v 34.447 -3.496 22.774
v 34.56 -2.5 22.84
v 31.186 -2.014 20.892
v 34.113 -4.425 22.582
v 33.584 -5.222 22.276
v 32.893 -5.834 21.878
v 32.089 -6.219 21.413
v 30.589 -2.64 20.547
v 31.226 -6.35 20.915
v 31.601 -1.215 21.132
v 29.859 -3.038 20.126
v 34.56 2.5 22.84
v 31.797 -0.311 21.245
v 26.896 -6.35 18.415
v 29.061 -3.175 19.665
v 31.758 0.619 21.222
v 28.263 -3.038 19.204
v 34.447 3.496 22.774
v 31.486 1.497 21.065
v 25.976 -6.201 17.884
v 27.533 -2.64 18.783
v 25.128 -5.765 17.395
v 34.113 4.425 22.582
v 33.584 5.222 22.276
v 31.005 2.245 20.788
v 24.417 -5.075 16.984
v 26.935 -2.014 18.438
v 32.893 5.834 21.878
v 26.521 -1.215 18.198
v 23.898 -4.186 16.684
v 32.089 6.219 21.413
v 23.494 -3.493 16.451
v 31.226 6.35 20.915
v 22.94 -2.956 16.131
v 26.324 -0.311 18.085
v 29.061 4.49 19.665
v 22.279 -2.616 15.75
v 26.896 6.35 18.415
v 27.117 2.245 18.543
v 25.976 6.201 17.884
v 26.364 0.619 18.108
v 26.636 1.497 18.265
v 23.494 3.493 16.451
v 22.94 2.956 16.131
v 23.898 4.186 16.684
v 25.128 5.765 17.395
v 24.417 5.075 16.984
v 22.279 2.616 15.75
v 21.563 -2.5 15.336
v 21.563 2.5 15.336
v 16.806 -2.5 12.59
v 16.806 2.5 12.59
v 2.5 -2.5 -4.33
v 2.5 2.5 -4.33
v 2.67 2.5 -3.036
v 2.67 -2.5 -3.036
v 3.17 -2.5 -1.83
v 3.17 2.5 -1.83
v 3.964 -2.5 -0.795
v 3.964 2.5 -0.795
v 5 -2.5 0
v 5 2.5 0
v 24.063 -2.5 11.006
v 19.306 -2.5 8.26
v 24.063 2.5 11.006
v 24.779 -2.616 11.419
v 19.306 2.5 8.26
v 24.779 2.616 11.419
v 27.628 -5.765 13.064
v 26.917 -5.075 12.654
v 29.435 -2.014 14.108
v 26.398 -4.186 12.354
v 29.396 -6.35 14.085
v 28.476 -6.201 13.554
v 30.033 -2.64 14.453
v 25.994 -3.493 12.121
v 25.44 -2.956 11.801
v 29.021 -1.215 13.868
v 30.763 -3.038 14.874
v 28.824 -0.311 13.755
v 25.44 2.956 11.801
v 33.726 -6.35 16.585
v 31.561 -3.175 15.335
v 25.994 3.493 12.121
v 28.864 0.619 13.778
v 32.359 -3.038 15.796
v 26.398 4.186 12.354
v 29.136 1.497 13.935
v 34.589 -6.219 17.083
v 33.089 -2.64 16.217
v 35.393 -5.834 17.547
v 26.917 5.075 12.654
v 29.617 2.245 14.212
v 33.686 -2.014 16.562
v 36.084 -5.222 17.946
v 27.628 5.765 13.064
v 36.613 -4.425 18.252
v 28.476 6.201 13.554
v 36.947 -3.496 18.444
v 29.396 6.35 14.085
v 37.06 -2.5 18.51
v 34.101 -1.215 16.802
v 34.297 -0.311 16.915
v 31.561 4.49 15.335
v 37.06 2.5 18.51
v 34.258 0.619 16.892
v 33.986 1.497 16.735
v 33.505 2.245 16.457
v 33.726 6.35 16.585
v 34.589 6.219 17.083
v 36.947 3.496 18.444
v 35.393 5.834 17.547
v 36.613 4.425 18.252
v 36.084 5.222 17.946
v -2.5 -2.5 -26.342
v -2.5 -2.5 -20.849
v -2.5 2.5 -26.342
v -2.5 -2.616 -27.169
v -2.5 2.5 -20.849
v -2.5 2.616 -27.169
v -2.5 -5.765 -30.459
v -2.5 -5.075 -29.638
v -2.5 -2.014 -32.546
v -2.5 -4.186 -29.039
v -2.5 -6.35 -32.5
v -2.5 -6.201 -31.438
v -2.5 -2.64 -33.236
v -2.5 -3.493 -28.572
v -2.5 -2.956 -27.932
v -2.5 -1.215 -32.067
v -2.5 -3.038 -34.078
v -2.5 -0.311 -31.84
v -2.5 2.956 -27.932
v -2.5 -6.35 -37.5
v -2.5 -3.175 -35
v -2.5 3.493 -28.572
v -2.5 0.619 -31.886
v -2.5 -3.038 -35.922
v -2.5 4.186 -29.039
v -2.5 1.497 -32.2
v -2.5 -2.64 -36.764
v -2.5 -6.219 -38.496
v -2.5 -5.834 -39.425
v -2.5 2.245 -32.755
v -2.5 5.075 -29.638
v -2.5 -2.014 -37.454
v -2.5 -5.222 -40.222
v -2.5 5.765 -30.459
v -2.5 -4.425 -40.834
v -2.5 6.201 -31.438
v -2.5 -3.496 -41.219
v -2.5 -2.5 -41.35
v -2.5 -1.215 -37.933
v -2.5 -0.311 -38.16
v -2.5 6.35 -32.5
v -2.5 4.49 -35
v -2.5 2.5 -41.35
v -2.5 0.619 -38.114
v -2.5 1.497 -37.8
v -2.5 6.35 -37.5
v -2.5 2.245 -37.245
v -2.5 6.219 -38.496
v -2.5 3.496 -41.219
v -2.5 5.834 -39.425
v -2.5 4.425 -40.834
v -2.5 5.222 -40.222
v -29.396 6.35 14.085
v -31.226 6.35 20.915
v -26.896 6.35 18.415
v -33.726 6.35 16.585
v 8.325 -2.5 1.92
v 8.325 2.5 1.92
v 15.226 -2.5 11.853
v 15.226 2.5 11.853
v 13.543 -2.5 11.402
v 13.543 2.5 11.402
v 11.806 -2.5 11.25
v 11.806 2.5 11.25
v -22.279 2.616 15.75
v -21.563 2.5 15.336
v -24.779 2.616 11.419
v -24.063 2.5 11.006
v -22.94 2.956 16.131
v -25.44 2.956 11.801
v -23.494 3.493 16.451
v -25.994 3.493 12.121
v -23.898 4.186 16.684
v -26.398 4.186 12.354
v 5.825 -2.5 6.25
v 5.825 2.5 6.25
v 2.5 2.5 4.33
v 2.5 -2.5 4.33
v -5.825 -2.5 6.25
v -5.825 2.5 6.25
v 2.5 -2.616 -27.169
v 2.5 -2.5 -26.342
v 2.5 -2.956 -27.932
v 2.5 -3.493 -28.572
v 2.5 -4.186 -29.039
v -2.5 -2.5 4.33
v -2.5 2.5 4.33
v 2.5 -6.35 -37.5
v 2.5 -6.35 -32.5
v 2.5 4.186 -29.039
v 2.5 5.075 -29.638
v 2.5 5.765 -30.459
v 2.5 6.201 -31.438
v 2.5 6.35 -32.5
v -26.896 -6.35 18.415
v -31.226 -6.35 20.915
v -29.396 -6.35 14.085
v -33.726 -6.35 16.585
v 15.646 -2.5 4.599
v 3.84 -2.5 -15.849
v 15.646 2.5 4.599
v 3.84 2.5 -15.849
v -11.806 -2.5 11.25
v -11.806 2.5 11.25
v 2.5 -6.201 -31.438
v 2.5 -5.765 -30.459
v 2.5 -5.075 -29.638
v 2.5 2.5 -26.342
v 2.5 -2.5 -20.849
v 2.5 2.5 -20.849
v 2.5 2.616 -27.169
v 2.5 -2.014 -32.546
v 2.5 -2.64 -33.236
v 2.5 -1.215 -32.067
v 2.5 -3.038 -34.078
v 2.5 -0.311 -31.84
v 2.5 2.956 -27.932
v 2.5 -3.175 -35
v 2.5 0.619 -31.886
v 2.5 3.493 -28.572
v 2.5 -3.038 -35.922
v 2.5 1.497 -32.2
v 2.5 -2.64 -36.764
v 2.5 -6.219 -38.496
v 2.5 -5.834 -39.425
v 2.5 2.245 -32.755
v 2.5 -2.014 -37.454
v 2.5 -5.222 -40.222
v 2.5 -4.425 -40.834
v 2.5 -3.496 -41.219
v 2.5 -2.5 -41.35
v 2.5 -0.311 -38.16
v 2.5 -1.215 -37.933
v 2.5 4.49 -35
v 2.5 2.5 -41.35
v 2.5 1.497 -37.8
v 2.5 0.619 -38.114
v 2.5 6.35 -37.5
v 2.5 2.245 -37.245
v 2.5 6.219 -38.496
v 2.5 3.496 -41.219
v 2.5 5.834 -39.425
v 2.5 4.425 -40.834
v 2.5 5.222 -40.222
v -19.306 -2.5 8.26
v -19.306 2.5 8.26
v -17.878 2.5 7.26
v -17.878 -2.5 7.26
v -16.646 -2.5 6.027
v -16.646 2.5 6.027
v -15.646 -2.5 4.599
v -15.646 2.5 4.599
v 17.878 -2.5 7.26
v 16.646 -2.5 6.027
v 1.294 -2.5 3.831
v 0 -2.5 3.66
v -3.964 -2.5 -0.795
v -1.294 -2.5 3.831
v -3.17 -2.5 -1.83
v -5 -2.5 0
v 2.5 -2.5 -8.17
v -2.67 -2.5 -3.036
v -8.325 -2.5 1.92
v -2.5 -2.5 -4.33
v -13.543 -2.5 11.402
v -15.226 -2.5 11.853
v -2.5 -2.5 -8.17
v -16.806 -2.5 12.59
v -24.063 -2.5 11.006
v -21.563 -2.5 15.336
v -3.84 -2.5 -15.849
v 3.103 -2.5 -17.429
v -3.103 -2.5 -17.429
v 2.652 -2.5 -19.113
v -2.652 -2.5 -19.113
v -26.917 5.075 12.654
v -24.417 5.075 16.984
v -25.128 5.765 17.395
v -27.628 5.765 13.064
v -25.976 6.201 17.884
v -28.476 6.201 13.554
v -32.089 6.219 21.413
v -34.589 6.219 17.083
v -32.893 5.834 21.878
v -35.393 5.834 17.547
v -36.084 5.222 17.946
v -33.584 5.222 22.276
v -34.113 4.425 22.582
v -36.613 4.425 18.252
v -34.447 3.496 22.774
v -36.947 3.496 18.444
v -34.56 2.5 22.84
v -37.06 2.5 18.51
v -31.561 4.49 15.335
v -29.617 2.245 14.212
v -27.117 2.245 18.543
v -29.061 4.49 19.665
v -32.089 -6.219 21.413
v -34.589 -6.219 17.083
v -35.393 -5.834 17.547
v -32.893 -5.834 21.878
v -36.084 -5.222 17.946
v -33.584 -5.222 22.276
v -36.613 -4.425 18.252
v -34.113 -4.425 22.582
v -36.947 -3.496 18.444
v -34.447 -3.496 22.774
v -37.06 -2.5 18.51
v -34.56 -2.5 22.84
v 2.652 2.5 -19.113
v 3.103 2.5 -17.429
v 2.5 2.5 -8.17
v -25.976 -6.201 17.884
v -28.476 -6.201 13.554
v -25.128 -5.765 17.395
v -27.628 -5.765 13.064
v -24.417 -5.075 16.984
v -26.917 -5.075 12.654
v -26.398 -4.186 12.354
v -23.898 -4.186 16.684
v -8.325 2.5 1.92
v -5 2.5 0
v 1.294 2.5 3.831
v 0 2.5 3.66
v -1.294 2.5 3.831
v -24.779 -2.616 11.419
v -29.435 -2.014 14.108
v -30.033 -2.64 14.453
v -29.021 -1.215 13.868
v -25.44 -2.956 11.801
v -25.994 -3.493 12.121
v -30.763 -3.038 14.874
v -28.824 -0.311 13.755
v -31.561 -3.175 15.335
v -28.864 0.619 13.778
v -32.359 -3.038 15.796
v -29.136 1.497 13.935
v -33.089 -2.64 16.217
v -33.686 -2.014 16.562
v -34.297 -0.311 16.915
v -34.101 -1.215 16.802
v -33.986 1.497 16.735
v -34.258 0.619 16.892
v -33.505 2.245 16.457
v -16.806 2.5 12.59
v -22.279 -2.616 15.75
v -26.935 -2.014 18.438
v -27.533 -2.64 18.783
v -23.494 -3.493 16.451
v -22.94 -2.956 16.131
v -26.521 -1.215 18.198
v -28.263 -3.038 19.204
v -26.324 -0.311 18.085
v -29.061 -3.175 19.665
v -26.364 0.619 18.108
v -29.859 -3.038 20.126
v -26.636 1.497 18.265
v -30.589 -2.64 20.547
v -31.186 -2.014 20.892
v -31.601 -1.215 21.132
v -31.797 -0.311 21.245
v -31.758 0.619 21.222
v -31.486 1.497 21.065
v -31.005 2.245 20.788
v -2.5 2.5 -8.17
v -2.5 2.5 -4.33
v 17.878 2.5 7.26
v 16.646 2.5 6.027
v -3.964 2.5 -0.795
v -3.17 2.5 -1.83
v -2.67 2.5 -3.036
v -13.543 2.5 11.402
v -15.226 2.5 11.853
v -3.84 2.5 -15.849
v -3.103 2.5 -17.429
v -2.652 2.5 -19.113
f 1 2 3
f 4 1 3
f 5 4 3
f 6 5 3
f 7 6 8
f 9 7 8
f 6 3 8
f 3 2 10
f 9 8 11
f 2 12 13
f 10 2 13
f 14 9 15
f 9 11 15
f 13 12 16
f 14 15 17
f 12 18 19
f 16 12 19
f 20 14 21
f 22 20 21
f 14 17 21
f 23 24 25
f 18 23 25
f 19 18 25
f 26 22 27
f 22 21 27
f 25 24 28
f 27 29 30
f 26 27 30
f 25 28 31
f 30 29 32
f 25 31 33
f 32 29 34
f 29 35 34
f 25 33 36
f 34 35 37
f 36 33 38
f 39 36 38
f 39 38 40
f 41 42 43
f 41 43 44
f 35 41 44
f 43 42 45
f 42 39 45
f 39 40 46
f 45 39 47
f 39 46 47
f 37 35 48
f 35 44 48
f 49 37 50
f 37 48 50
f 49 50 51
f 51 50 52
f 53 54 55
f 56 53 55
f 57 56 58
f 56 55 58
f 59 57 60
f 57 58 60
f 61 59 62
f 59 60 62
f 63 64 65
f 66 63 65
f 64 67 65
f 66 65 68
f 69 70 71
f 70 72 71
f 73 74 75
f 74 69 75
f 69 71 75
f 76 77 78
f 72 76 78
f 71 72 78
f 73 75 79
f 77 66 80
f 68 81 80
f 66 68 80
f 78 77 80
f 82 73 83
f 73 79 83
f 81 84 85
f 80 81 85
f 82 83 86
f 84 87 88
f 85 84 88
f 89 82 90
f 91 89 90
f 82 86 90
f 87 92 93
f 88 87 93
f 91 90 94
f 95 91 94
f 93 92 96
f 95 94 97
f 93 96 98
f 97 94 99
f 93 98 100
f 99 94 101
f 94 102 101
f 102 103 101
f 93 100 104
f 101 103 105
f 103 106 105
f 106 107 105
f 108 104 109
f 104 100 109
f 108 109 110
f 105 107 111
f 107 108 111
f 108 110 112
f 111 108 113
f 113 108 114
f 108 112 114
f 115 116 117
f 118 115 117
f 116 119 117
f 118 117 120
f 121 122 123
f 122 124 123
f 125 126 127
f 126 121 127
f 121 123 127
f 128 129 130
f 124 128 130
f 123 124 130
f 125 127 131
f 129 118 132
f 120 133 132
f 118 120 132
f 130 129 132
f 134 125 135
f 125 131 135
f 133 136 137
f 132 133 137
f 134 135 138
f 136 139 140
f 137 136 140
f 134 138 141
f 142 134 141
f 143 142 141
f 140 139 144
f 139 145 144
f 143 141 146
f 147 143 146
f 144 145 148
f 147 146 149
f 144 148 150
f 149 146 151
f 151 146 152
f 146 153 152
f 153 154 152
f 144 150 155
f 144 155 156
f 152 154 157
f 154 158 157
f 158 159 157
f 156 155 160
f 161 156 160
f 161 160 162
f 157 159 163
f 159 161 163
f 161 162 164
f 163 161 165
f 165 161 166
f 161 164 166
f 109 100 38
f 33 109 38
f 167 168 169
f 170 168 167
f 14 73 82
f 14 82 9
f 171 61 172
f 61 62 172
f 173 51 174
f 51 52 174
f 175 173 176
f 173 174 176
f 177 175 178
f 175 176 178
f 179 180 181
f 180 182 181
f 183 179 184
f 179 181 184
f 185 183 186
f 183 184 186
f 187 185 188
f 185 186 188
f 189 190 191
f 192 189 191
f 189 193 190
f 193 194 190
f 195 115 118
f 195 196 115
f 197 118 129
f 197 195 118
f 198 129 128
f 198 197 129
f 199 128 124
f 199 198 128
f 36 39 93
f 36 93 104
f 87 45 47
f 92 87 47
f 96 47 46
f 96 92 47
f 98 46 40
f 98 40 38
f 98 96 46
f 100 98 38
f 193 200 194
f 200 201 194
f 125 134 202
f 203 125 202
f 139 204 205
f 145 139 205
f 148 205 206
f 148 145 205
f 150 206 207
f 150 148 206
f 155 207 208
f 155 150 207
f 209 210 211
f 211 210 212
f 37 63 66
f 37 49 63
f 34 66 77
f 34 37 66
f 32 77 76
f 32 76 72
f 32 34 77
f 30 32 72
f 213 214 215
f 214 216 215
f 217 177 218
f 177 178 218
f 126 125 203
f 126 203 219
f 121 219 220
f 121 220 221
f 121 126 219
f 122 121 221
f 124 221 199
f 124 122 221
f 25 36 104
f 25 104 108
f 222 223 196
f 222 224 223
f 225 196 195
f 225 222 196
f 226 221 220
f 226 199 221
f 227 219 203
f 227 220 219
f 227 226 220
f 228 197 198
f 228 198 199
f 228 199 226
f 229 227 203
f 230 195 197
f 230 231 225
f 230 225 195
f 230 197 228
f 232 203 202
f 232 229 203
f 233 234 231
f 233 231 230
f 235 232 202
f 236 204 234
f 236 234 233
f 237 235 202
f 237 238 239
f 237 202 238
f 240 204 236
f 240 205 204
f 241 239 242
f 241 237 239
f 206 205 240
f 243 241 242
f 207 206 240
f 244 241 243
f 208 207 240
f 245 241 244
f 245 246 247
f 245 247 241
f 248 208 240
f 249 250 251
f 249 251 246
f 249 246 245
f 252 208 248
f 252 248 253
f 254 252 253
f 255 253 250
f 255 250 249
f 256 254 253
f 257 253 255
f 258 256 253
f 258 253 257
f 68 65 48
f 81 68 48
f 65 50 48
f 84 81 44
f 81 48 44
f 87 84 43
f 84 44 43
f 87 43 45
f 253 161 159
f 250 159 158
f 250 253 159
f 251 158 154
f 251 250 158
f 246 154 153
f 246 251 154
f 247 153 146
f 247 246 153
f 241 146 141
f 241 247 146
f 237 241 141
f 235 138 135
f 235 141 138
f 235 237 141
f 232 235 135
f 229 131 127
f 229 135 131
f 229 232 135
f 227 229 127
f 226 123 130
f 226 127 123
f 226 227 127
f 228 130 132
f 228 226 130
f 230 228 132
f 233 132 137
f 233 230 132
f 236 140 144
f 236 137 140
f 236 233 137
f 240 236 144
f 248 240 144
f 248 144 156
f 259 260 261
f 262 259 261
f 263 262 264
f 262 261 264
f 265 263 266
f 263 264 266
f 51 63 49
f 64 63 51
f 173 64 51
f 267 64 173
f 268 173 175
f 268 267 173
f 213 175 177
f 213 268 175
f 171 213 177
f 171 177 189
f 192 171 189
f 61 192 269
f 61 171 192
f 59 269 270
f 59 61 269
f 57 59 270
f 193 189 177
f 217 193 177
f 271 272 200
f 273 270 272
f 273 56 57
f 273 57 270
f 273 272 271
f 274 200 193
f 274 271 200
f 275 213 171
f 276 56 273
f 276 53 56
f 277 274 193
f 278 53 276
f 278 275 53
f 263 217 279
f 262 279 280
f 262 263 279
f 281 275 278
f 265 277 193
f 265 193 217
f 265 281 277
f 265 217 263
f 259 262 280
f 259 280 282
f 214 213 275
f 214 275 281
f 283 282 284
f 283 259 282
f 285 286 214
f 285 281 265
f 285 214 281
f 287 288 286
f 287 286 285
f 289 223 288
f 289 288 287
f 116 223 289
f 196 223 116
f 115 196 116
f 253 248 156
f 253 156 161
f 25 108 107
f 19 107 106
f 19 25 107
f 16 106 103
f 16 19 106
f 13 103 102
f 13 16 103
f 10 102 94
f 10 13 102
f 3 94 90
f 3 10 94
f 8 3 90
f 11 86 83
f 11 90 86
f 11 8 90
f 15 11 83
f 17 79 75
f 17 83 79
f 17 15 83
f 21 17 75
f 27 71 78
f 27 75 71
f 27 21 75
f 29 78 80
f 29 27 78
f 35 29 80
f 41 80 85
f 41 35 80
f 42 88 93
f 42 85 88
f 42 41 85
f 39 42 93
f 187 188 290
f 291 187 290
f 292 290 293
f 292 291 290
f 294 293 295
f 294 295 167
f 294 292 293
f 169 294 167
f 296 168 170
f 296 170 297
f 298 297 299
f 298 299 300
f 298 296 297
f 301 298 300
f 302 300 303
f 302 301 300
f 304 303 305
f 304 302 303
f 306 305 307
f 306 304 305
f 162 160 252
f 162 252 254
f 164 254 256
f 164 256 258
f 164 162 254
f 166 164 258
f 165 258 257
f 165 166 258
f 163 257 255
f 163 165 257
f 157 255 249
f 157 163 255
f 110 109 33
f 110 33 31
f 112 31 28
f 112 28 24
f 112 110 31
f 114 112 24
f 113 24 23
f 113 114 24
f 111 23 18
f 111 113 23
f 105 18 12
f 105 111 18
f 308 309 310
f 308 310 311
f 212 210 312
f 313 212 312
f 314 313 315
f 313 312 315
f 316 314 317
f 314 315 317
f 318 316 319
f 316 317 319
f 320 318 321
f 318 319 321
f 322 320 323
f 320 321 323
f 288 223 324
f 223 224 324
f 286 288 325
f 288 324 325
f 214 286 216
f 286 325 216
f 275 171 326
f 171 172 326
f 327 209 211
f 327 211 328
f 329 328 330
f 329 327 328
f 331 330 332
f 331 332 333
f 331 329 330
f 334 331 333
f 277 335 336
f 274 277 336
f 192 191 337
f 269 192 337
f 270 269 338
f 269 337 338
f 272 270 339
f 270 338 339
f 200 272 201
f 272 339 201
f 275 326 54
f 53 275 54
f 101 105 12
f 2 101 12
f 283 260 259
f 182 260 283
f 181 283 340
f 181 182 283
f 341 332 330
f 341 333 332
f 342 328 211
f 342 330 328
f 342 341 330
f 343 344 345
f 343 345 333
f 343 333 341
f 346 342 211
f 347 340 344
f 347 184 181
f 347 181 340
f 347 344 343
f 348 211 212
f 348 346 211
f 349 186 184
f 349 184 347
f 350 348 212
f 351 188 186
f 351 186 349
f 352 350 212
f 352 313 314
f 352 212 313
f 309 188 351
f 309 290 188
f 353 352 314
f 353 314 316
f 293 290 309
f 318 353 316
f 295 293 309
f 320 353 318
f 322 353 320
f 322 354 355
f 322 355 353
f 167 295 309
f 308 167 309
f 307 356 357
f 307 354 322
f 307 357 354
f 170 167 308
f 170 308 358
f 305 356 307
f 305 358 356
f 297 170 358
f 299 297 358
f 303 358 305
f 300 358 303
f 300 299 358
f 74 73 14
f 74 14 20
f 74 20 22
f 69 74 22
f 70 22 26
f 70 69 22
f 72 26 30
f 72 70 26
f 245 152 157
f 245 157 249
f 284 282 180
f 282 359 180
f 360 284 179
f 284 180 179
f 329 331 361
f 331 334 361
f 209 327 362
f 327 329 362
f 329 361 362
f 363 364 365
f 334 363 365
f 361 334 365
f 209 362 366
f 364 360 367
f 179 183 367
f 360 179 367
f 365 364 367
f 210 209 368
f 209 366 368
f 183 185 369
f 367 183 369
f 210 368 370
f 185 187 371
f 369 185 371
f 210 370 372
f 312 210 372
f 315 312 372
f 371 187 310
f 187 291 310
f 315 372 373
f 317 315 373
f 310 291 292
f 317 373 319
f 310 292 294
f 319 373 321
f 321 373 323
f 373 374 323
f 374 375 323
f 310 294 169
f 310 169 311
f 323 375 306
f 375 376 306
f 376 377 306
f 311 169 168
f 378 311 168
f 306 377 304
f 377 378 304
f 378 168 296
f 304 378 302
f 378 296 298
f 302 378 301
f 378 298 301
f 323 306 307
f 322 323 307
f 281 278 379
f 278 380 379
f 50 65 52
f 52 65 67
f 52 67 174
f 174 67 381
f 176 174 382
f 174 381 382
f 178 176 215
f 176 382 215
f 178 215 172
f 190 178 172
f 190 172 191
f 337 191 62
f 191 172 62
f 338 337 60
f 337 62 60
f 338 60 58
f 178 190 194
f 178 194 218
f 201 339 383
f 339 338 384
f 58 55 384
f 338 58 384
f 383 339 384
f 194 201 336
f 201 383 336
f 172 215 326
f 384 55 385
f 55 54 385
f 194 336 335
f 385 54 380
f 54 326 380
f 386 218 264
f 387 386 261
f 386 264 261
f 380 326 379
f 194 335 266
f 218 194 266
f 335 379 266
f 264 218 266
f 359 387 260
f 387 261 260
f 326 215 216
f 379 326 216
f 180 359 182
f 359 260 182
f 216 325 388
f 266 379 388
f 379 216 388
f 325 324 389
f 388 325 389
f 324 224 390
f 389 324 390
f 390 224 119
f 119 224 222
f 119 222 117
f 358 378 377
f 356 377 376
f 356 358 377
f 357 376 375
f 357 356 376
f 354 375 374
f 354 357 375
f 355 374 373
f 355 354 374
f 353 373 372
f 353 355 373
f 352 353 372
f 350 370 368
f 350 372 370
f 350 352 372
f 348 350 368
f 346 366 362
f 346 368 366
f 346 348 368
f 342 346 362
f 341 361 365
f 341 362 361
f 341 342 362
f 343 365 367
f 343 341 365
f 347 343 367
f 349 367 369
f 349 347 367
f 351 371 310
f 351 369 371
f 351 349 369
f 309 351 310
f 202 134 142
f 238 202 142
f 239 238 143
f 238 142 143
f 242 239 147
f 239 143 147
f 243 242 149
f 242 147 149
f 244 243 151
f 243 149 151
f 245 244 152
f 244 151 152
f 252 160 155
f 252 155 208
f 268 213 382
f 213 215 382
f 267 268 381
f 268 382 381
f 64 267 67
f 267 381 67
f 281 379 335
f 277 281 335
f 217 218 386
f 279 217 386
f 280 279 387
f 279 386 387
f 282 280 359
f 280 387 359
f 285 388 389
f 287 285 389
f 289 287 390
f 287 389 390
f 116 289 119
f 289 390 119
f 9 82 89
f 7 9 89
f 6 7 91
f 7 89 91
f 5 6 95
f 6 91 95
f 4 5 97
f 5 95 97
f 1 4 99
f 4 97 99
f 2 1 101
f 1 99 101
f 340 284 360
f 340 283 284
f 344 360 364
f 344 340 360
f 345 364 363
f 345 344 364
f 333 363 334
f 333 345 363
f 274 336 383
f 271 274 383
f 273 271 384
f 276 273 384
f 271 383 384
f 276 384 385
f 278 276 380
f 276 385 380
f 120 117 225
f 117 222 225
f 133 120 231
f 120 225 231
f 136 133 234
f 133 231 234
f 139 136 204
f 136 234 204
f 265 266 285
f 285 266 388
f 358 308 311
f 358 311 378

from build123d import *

# Parameters (mm, degrees)
SALIENTE_EXTRUIR1_DEPTH = 2.5
CROQUIS2_W              = 5
CROQUIS2_H              = 12.7
SALIENTE_EXTRUIR2_DEPTH = 6.350000000000001
CORTAR_EXTRUIR1_REACH   = 52.655
CORTAR_EXTRUIR2_REACH   = 52.655
MATRIZC7_COUNT          = 3
REDONDEO3_R             = 3
REDONDEO4_R             = 3
REDONDEO5_R             = 3
REDONDEO6_R             = 3
REDONDEO7_R             = 3
REDONDEO8_R             = 3


with BuildPart() as part:
    # Croquis1 → Saliente-Extruir1 (new, symmetric)
    with BuildSketch(Plane(origin=(0, 0, 0), x_dir=(1, 0, 0), z_dir=(0, 1, 0))):
        with BuildLine():
            Line((-2.5, 28.650000000000002), (2.5, 28.650000000000002))
            Line((2.5, 28.650000000000002), (2.5, 20.849364905389077))
            ThreePointArc((2.5, 20.849364905389077), (2.8407417371092976, 18.26117445436386), (3.8397459621556003, 15.84936490538906))
            Line((3.8397459621556003, 15.84936490538906), (15.64582562299427, -4.599364905389191))
            ThreePointArc((15.64582562299427, -4.599364905389191), (17.235011848973173, -6.670432717254639), (19.306079660838602, -8.259618943233573))
            Line((19.306079660838602, -8.259618943233573), (26.061627818424082, -12.159936490539094))
            Line((26.061627818424082, -12.159936490539094), (23.561627818424125, -16.490063509461137))
            Line((23.561627818424125, -16.490063509461137), (16.806079660838638, -12.589745962155668))
            ThreePointArc((16.806079660838638, -12.589745962155668), (14.394270111863824, -11.590741737109344), (11.80607966083859, -11.25000000000002))
            Line((11.80607966083859, -11.25000000000002), (-11.806079660838877, -11.250000000000021))
            ThreePointArc((-11.806079660838877, -11.250000000000021), (-14.394270111864046, -11.590741737109328), (-16.806079660838808, -12.589745962155595))
            Line((-16.806079660838808, -12.589745962155595), (-23.561627818424295, -16.490063509460935))
            Line((-23.561627818424295, -16.490063509460935), (-26.061627818424316, -12.15993649053858))
            Line((-26.061627818424316, -12.15993649053858), (-19.30607966083857, -8.259618943233107))
            ThreePointArc((-19.30607966083857, -8.259618943233107), (-17.235011848973045, -6.670432717254254), (-15.645825622994131, -4.5993649053887635))
            Line((-15.645825622994131, -4.5993649053887635), (-3.8397459621555967, 15.849364905389269))
            ThreePointArc((-3.8397459621555967, 15.849364905389269), (-2.8407417371093064, 18.26117445436405), (-2.5000000000000004, 20.84936490538924))
            Line((-2.5000000000000004, 20.84936490538924), (-2.5, 28.650000000000002))
        make_face()
        with BuildLine():
            Line((4.999999999999967, -1.648e-14), (8.325317547305488, -1.919872981077918))
            Line((8.325317547305488, -1.919872981077918), (2.5, 8.169872981077836))
            Line((2.5, 8.169872981077836), (2.5000000000000004, 4.330127018922162))
            ThreePointArc((2.5000000000000004, 4.330127018922162), (3.16987298107781, 1.8301270189221883), (4.999999999999967, -1.648e-14))
        make_face(mode=Mode.SUBTRACT)
        with BuildLine():
            Line((-2.499999999999762, -4.330127018922147), (-5.825317547305628, -6.250000000000082))
            Line((-5.825317547305628, -6.250000000000082), (5.825317547305489, -6.249999999999961))
            Line((5.825317547305489, -6.249999999999961), (2.5000000000002185, -4.3301270189221945))
            ThreePointArc((2.5000000000002185, -4.3301270189221945), (1.9836e-13, -3.660254037844239), (-2.499999999999762, -4.330127018922147))
        make_face(mode=Mode.SUBTRACT)
        with BuildLine():
            Line((-2.5000000000000004, 4.330127018922227), (-2.5, 8.169872981077782))
            Line((-2.5, 8.169872981077782), (-8.325317547305644, -1.9198729810777775))
            Line((-8.325317547305644, -1.9198729810777775), (-5.000000000000053, 0))
            ThreePointArc((-5.000000000000053, 0), (-3.1698729810778152, 1.8301270189221972), (-2.5000000000000004, 4.330127018922227))
        make_face(mode=Mode.SUBTRACT)
    extrude(amount=SALIENTE_EXTRUIR1_DEPTH, both=True)

    # Croquis2 → Saliente-Extruir2 (add, symmetric)
    with BuildSketch(Plane(origin=(0, 0, 0), x_dir=(1, 0, 0), z_dir=(0, 1, 0))):
        with Locations((0, 35)):
            Rectangle(CROQUIS2_W, CROQUIS2_H)
    saliente_extruir2 = extrude(amount=SALIENTE_EXTRUIR2_DEPTH, both=True)

    # Croquis3 → Cortar-Extruir1 (cut, up to next)
    with BuildSketch(Plane(origin=(2.5, 0, 0), x_dir=(0, 0, -1), z_dir=(1, 0, 0)), mode=Mode.PRIVATE) as cortar_extruir1_sk1:
        with BuildLine():
            Line((32.754935969732706, 2.2450640302672804), (35, 4.490128060534589))
            Line((35, 4.490128060534589), (37.245064030267294, 2.245064030267292))
            ThreePointArc((37.245064030267294, 2.245064030267292), (35.00000000000001, -3.174999999999998), (32.754935969732706, 2.2450640302672804))
        make_face()
    cortar_extruir1_tool1 = extrude(cortar_extruir1_sk1.sketch, amount=-CORTAR_EXTRUIR1_REACH, mode=Mode.PRIVATE) & part.part
    cortar_extruir1 = cortar_extruir1_tool1.solids().sort_by_distance((2.5, 0.222977, -35))[0]
    add(cortar_extruir1, mode=Mode.SUBTRACT)

    # Croquis4 → Cortar-Extruir2 (cut, up to next)
    with BuildSketch(Plane.ZY.offset(2.5000000000000018), mode=Mode.PRIVATE) as cortar_extruir2_sk1:
        with BuildLine():
            Line((-41.35, 6.350000000000001), (-37.50000000000001, 6.350000000000001))
            ThreePointArc((-37.50000000000001, 6.350000000000001), (-40.22236110756822, 5.222361107568213), (-41.35, 2.500000000000002))
            Line((-41.35, 2.500000000000002), (-41.35, 6.350000000000001))
        make_face()
    cortar_extruir2_tool1 = extrude(cortar_extruir2_sk1.sketch, amount=-CORTAR_EXTRUIR2_REACH, mode=Mode.PRIVATE) & part.part
    # Croquis4 → Cortar-Extruir2 (cut, up to next)
    with BuildSketch(Plane.ZY.offset(2.5000000000000018), mode=Mode.PRIVATE) as cortar_extruir2_sk2:
        with BuildLine():
            Line((-32.5, 6.350000000000001), (-28.650000000000002, 6.350000000000001))
            Line((-28.650000000000002, 6.350000000000001), (-28.650000000000002, 2.5))
            ThreePointArc((-28.650000000000002, 2.5), (-29.777638892431792, 5.222361107568209), (-32.5, 6.350000000000001))
        make_face()
    cortar_extruir2_tool2 = extrude(cortar_extruir2_sk2.sketch, amount=-CORTAR_EXTRUIR2_REACH, mode=Mode.PRIVATE) & part.part
    # Croquis4 → Cortar-Extruir2 (cut, up to next)
    with BuildSketch(Plane.ZY.offset(2.5000000000000018), mode=Mode.PRIVATE) as cortar_extruir2_sk3:
        with BuildLine():
            Line((-41.35, -2.500000000000002), (-41.35, -6.350000000000001))
            Line((-41.35, -6.350000000000001), (-37.50000000000001, -6.350000000000001))
            ThreePointArc((-37.50000000000001, -6.350000000000001), (-40.22236110756821, -5.222361107568203), (-41.35, -2.500000000000002))
        make_face()
    cortar_extruir2_tool3 = extrude(cortar_extruir2_sk3.sketch, amount=-CORTAR_EXTRUIR2_REACH, mode=Mode.PRIVATE) & part.part
    # Croquis4 → Cortar-Extruir2 (cut, up to next)
    with BuildSketch(Plane.ZY.offset(2.5000000000000018), mode=Mode.PRIVATE) as cortar_extruir2_sk4:
        with BuildLine():
            Line((-28.650000000000002, -2.5000000000000004), (-28.650000000000002, -6.350000000000001))
            Line((-28.650000000000002, -6.350000000000001), (-32.5, -6.350000000000001))
            ThreePointArc((-32.5, -6.350000000000001), (-29.777638892431792, -5.222361107568209), (-28.650000000000002, -2.5000000000000004))
        make_face()
    cortar_extruir2_tool4 = extrude(cortar_extruir2_sk4.sketch, amount=-CORTAR_EXTRUIR2_REACH, mode=Mode.PRIVATE) & part.part
    cortar_extruir2_1 = cortar_extruir2_tool1.solids().sort_by_distance((-2.5, 5.490033, -40.490033))[0]
    add(cortar_extruir2_1, mode=Mode.SUBTRACT)
    cortar_extruir2_2 = cortar_extruir2_tool2.solids().sort_by_distance((-2.5, 5.490033, -29.509967))[0]
    add(cortar_extruir2_2, mode=Mode.SUBTRACT)
    cortar_extruir2_3 = cortar_extruir2_tool3.solids().sort_by_distance((-2.5, -5.490033, -40.490033))[0]
    add(cortar_extruir2_3, mode=Mode.SUBTRACT)
    cortar_extruir2_4 = cortar_extruir2_tool4.solids().sort_by_distance((-2.5, -5.490033, -29.509967))[0]
    add(cortar_extruir2_4, mode=Mode.SUBTRACT)
    cortar_extruir2 = cortar_extruir2_1 + cortar_extruir2_2 + cortar_extruir2_3 + cortar_extruir2_4  # Cortar-Extruir2 as one shape, for the pattern or mirror that repeats it

    # MatrizC7: Saliente-Extruir2, Cortar-Extruir1, Cortar-Extruir2 ×3 about axis
    matrizc7_axis = Axis((-4.13e-15, 0, 3.06e-15), (0, 1, 0))
    add([saliente_extruir2.rotate(matrizc7_axis, i * 360 / MATRIZC7_COUNT) for i in range(1, MATRIZC7_COUNT)])
    add([cortar_extruir1.rotate(matrizc7_axis, i * 360 / MATRIZC7_COUNT) for i in range(1, MATRIZC7_COUNT)], mode=Mode.SUBTRACT)
    add([cortar_extruir2.rotate(matrizc7_axis, i * 360 / MATRIZC7_COUNT) for i in range(1, MATRIZC7_COUNT)], mode=Mode.SUBTRACT)

    # Redondeo3
    redondeo3_edges = [part.edges().sort_by_distance(p)[0] for p in [
        (0, 2.5, -28.650000000000002),
    ]]
    fillet(redondeo3_edges, radius=REDONDEO3_R)

    # Redondeo4
    redondeo4_edges = [part.edges().sort_by_distance(p)[0] for p in [
        (-24.811627818424306, 2.5, 14.324999999999758),
    ]]
    fillet(redondeo4_edges, radius=REDONDEO4_R)

    # Redondeo5
    redondeo5_edges = [part.edges().sort_by_distance(p)[0] for p in [
        (24.811627818424103, 2.5, 14.325000000000117),
    ]]
    fillet(redondeo5_edges, radius=REDONDEO5_R)

    # Redondeo6
    redondeo6_edges = [part.edges().sort_by_distance(p)[0] for p in [
        (-24.811627818424306, -2.5, 14.324999999999758),
    ]]
    fillet(redondeo6_edges, radius=REDONDEO6_R)

    # Redondeo7
    redondeo7_edges = [part.edges().sort_by_distance(p)[0] for p in [
        (0, -2.5, -28.650000000000002),
    ]]
    fillet(redondeo7_edges, radius=REDONDEO7_R)

    # Redondeo8
    redondeo8_edges = [part.edges().sort_by_distance(p)[0] for p in [
        (24.811627818424103, -2.5, 14.325000000000117),
    ]]
    fillet(redondeo8_edges, radius=REDONDEO8_R)


solid = part.part
